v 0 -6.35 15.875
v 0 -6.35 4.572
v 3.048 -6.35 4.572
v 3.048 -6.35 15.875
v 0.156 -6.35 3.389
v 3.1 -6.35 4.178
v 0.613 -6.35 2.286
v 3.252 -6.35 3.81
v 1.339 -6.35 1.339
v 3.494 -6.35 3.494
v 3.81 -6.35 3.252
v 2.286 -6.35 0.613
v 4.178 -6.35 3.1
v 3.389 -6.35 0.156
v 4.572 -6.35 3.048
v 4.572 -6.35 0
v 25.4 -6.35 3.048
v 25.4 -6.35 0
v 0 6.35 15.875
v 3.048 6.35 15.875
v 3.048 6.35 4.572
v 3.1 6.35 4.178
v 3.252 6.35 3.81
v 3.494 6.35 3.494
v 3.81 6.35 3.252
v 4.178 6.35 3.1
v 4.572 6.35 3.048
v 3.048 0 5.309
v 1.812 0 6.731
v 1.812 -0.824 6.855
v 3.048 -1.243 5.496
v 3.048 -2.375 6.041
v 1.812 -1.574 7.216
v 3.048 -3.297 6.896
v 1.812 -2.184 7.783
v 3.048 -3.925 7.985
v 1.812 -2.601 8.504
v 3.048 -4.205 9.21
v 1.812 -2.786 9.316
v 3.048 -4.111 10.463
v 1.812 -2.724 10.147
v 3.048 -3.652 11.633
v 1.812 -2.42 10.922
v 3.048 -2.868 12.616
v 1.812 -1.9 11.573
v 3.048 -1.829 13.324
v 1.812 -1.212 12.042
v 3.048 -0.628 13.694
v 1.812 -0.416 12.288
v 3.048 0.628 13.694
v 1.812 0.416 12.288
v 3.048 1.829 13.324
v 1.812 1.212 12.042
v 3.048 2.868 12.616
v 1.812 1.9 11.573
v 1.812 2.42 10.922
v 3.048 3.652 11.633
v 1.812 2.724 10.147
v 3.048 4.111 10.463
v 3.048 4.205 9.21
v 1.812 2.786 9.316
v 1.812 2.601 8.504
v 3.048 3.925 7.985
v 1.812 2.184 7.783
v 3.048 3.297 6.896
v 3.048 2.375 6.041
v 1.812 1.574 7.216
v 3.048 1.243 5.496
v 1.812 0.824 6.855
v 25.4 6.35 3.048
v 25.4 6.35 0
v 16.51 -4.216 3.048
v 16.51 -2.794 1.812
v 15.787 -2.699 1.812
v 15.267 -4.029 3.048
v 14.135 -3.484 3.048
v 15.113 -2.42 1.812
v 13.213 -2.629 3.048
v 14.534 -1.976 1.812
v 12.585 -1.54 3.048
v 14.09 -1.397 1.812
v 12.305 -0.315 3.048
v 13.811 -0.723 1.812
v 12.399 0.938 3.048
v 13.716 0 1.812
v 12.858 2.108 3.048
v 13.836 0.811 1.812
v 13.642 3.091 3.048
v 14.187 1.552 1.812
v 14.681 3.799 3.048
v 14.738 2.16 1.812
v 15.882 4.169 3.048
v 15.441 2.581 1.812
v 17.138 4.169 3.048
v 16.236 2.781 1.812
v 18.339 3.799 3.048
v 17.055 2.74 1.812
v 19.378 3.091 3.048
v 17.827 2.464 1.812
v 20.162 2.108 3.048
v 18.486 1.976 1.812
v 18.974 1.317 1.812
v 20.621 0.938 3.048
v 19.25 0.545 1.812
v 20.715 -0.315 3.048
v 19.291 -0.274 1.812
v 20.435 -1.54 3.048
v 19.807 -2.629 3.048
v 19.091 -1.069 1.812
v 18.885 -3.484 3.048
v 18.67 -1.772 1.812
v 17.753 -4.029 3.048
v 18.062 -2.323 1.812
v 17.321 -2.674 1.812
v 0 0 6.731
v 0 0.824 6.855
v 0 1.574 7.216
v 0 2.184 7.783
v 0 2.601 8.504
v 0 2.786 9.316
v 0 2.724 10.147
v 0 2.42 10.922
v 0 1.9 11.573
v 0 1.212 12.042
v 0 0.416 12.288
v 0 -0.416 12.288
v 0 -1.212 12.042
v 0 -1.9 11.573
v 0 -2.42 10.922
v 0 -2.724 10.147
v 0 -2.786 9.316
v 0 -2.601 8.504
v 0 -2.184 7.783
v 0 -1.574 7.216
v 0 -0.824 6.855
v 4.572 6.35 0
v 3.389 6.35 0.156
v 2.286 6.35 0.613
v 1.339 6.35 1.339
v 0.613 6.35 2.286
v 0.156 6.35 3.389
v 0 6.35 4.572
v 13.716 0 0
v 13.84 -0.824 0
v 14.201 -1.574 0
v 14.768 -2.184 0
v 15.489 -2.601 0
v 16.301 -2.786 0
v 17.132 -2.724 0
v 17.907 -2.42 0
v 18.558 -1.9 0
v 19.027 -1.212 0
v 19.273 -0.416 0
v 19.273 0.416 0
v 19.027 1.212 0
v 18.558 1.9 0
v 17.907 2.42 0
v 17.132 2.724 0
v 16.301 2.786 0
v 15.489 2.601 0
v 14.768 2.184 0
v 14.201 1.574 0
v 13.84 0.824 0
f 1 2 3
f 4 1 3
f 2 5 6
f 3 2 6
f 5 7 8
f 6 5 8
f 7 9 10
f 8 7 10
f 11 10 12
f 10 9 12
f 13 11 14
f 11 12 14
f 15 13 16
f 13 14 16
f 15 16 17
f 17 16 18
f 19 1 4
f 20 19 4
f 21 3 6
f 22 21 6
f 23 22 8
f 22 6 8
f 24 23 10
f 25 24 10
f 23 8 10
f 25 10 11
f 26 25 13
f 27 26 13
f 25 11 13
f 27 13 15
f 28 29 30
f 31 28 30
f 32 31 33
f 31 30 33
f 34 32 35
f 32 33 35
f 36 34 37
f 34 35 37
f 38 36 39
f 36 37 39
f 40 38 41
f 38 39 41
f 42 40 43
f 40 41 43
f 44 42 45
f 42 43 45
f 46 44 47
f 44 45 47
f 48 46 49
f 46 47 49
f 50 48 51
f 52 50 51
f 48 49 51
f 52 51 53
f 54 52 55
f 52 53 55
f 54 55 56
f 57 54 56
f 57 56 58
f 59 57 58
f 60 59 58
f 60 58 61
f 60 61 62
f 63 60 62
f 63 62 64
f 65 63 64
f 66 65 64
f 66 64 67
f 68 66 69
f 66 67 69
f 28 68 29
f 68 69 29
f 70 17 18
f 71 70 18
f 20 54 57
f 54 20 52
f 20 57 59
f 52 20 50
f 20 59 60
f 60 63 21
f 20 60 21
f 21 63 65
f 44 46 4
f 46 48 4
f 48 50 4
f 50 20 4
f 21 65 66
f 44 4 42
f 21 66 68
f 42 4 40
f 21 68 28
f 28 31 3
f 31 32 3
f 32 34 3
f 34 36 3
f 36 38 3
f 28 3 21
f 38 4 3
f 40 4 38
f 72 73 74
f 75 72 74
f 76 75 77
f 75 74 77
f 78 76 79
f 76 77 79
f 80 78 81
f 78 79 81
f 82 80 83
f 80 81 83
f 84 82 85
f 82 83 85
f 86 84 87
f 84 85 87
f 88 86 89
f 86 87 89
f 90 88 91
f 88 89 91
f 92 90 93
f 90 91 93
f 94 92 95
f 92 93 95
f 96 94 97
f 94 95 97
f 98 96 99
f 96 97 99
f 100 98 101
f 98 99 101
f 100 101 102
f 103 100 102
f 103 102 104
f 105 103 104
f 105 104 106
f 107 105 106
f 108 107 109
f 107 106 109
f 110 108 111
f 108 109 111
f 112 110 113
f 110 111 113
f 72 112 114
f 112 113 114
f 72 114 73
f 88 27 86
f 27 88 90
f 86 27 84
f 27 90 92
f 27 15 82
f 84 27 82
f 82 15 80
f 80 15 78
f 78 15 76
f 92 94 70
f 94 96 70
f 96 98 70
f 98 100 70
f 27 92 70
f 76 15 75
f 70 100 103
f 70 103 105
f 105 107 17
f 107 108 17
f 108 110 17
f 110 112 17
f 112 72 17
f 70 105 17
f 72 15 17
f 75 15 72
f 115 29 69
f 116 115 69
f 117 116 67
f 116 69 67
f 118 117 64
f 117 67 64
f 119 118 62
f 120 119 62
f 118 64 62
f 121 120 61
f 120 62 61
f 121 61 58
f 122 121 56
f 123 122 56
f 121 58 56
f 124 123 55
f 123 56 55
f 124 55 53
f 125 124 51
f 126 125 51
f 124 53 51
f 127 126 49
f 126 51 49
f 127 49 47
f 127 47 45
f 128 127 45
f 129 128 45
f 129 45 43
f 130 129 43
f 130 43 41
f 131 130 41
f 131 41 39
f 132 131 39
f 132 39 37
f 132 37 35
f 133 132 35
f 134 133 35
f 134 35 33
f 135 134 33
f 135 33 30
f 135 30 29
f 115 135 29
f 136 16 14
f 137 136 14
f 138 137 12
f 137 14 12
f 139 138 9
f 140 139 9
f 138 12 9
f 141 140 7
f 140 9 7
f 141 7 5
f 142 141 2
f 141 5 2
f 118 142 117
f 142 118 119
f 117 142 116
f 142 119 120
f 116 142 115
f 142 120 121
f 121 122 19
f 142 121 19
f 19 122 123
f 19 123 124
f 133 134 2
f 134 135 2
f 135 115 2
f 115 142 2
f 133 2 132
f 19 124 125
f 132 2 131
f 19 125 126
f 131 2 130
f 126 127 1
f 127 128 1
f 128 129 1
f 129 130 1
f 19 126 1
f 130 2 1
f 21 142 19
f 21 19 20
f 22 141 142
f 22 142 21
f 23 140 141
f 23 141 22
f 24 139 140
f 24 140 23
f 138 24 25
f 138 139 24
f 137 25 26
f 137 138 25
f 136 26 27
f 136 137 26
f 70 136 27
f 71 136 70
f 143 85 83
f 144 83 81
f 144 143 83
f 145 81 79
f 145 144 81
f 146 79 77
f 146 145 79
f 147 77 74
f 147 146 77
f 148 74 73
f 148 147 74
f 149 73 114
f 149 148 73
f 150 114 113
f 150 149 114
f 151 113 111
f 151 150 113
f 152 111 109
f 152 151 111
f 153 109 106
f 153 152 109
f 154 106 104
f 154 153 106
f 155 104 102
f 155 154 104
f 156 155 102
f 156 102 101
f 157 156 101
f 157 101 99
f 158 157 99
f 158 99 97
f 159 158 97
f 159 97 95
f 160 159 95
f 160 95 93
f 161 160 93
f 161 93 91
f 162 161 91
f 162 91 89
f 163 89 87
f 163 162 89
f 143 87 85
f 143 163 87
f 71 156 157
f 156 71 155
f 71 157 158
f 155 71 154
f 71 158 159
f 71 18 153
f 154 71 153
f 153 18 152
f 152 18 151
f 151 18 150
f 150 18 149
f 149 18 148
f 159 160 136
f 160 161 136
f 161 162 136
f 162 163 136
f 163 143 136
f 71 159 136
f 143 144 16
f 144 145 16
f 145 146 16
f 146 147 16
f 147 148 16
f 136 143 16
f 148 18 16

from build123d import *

# Parameters (mm, degrees)
EXTRUDE_THIN1_START = -6.35
EXTRUDE_THIN1_DEPTH = 12.7
SKETCH4_R           = 2.794
EXTRUDE3_DEPTH      = 29.141606724
SKETCH6_R           = 2.794
CUT_EXTRUDE1_DEPTH  = 31.618591166


# Read off the part's stored shape, not the designer's step: Extrude-Thin1
with BuildPart() as part:
    # Extrude-Thin1 outline → Extrude-Thin1 (new body)
    with BuildSketch(Plane(origin=(0, 0, 0), x_dir=(1, 0, 0), z_dir=(0, 1, 0)).offset(EXTRUDE_THIN1_START)):
        with BuildLine():
            Line((4.572, -3.048), (25.4, -3.048))
            Line((25.4, -3.048), (25.4, 0))
            Line((25.4, 0), (4.572, 0))
            ThreePointArc((4.572, 0), (1.339107796, -1.339107796), (0, -4.572))
            Line((0, -4.572), (0, -15.875))
            Line((0, -15.875), (3.048, -15.875))
            Line((3.048, -15.875), (3.048, -4.572))
            ThreePointArc((3.048, -4.572), (3.494369265, -3.494369265), (4.572, -3.048))
        make_face()
    extrude(amount=EXTRUDE_THIN1_DEPTH)

    # Sketch4 → Extrude3 (cut, through all)
    with BuildSketch(Plane(origin=(3.048, 0, 0), x_dir=(0, 0, -1), z_dir=(1, 0, 0))):
        with Locations((-9.525, 0)):
            Circle(SKETCH4_R)
    extrude(amount=-EXTRUDE3_DEPTH, mode=Mode.SUBTRACT)

    # Sketch6 → Cut-Extrude1 (cut, through all)
    with BuildSketch(Plane.XY):
        with Locations(Location((16.51, 0, 0), (0, 0, 180))):
            Circle(SKETCH6_R)
    extrude(amount=CUT_EXTRUDE1_DEPTH, mode=Mode.SUBTRACT)

    # Cut-Extrude2 cone 1 section (through the dimple's axis) → Cut-Extrude2 (revolve, cut)
    with BuildSketch(Plane(origin=(3.048, 0, 9.525), x_dir=(0, 0, -1), z_dir=(0, 1, 0))):
        Polygon((0, 0), (4.2164, 0), (0, 3.665260601), align=None)
    revolve(axis=Axis((3.048, 0, 9.525), (-1, 0, 0)), mode=Mode.SUBTRACT)

    # Cut-Extrude3 cone 1 section (through the dimple's axis) → Cut-Extrude3 (revolve, cut)
    with BuildSketch(Plane(origin=(16.51, 0, 3.048), x_dir=(0, -1, 0), z_dir=(1, 0, 0))):
        Polygon((0, 0), (4.2164, 0), (0, 3.665260601), align=None)
    revolve(axis=Axis((16.51, 0, 3.048), (0, 0, -1)), mode=Mode.SUBTRACT)


solid = part.part
